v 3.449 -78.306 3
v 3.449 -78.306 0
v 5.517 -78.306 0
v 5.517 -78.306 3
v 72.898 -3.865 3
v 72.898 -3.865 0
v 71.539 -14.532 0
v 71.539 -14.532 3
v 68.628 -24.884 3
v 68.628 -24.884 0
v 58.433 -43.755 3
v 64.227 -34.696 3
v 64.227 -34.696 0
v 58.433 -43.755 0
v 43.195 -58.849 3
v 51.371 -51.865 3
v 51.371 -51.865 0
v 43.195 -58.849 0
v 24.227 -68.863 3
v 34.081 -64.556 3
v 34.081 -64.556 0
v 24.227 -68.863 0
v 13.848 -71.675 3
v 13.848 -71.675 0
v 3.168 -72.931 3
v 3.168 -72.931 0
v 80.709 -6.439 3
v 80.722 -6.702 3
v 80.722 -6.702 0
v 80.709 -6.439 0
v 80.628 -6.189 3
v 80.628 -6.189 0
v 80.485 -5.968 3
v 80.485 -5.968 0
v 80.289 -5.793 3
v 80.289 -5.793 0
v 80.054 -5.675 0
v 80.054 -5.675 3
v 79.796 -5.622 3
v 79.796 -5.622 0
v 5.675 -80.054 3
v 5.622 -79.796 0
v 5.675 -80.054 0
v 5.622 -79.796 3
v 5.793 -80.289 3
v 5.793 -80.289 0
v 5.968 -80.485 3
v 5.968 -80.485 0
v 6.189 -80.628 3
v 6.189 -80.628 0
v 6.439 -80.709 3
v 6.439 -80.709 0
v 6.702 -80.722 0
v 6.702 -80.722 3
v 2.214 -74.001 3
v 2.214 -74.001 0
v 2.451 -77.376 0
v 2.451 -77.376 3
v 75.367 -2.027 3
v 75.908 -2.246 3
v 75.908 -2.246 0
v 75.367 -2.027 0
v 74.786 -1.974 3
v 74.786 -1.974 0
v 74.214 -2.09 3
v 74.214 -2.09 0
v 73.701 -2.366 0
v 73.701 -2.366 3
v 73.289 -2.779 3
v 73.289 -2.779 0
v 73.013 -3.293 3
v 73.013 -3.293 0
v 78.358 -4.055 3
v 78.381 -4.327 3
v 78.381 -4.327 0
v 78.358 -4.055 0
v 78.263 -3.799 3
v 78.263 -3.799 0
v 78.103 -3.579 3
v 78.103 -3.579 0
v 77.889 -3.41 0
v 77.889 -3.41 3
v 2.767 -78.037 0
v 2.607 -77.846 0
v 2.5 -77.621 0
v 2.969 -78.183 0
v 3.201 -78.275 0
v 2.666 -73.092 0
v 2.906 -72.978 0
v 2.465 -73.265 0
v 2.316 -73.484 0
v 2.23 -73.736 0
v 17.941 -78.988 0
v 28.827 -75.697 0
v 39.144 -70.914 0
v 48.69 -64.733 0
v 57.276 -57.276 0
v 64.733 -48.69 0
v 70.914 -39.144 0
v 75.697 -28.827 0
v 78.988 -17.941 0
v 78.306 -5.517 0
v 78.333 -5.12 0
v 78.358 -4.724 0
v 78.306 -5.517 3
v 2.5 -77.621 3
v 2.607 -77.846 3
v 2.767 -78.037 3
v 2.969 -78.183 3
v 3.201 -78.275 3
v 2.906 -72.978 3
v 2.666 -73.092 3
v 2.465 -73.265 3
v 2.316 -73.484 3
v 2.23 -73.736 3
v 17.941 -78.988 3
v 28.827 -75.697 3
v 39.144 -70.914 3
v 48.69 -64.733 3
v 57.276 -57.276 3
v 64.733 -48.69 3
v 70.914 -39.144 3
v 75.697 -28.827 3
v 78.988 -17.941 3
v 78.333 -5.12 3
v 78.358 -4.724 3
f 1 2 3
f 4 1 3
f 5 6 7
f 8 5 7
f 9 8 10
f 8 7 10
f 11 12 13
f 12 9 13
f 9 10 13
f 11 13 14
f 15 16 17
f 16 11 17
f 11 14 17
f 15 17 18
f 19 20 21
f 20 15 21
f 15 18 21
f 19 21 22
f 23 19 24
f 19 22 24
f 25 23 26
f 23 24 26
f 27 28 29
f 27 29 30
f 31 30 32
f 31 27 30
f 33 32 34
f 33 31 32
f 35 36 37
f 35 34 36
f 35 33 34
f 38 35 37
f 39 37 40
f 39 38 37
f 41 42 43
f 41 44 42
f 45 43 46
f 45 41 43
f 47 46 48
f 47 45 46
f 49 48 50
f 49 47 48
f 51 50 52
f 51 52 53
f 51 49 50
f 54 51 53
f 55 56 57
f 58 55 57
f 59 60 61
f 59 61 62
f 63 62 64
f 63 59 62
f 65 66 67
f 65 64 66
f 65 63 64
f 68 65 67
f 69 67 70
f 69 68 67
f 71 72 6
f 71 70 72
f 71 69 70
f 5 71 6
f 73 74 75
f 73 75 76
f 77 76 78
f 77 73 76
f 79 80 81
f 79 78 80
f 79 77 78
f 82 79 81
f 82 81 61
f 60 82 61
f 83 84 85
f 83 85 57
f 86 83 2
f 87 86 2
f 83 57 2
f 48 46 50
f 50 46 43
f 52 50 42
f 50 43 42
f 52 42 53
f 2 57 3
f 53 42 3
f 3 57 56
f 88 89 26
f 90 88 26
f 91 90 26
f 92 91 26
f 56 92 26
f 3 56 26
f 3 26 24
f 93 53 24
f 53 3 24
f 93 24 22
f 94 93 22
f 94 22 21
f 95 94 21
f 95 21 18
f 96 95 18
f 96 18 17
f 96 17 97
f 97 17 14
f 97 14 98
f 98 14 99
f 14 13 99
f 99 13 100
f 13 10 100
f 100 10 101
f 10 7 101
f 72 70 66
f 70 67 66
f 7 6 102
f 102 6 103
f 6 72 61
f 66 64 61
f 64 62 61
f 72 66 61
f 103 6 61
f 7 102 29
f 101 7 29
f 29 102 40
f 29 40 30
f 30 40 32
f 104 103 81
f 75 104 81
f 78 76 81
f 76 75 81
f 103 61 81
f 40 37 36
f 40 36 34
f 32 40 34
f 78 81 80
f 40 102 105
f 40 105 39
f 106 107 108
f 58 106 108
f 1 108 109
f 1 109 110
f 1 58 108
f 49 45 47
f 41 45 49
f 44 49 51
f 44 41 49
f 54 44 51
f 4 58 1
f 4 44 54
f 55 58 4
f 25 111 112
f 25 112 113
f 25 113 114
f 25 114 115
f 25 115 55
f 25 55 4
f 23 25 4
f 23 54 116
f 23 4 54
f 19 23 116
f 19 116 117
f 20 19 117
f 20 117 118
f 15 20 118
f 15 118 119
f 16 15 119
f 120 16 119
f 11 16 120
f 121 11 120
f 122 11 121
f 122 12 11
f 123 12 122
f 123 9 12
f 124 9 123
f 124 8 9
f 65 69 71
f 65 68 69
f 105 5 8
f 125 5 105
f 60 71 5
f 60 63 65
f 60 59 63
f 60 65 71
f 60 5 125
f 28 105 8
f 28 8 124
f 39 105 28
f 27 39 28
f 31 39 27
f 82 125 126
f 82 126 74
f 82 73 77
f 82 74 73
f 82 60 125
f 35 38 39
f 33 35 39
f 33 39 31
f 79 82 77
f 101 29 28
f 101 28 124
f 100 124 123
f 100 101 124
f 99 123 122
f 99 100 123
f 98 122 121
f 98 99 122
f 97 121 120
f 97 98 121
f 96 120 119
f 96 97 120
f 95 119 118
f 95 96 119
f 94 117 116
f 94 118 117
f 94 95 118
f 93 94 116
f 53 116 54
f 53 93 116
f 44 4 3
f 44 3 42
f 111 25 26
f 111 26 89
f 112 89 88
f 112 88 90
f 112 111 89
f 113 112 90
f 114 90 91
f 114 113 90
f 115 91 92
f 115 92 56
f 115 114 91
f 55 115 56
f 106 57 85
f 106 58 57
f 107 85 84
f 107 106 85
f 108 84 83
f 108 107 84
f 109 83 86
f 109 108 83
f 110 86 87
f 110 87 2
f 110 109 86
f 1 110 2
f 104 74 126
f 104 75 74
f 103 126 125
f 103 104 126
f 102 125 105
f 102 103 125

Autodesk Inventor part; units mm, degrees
ref_plane "YZ Plane" through (0, 0, 0) normal (1, 0, 0) x (0, 1, 0)
ref_plane "XZ Plane" through (0, 0, 0) normal (0, 1, 0) x (-1, 0, 0)
ref_plane "XY Plane" through (0, 0, 0) normal (0, 0, 1) x (1, 0, 0)
sketch "Sketch1" plane through (0, 0, 0) normal (0, 0, 1) x (1, 0, 0)
  arc A0 (5.6926, -80.7997) -> (80.8293, -5.2553) centre (0, 0) ccw
  arc A1 (2.1409, -72.9686) -> (72.998, -0.5377) centre (0, 0) ccw
  line L0 (72.998, -0.5377) -> (80.8095, -0.5953) construction
  line L1 (0, 0) -> (0, 0) construction
  line L2 (2.1409, -72.9686) -> (2.5169, -78.3059)
  line L3 (2.5169, -78.3059) -> (5.5169, -78.3059)
  line L4 (5.5169, -78.3059) -> (5.6926, -80.7997)
  line L5 (78.412, -3.7169) -> (72.998, -0.5377)
  line L6 (78.3059, -5.5169) -> (80.7997, -5.6926)
  arc A2 (78.3059, -5.5169) -> (78.412, -3.7169) centre (0, 0) ccw
  line L7 (0, 0) -> (0, -120.2528) construction
  line L8 (0, 0) -> (5.9355, -84.2471) construction
  line L9 (0, 0) -> (88.2589, 0) construction
  line L10 (0, 0) -> (93.5685, -6.5922) construction
  line L11 (72.998, -0.5377) -> (0, 0) construction
  dimension "d0" = 162
  dimension "d1" = 146
  dimension "d38" = 2.5
  dimension "d39" = 3
  dimension "d40" = 30
  dimension "d52" = 78.5
  dimension "d53" = 1.8
  dimension "d55" = 4.03
  dimension "d57" = 4.03
extrude "Extrusion1" add sketch "Sketch1" along normal blind 3
fillet "Fillet6" radius 2 1 edges at (72.998, -0.5377, 1.5)
sketch "Sketch5" plane through (0, 0, 3) normal (0, 0, 1) x (1, 0, 0)
  line L0 (10.4211, -74.15) -> (12.817, -75.9554)
  line L1 (12.817, -75.9554) -> (11.0116, -78.3513)
  line L2 (11.0116, -78.3513) -> (8.6157, -76.5459)
  line L3 (8.6157, -76.5459) -> (10.4211, -74.15)
  line L4 (0, 0) -> (11.0116, -78.3513) construction
  line L5 (12.817, -75.9554) -> (8.6157, -76.5459) construction
  line L6 (0, 0) -> (0, -125.3413) construction
  line L7 (15.0785, -75.539) -> (16.6742, -72.9985)
  line L8 (16.6742, -72.9985) -> (19.2146, -74.5942)
  line L9 (19.2146, -74.5942) -> (17.619, -77.1347)
  line L10 (17.619, -77.1347) -> (15.0785, -75.539)
  line L11 (21.4327, -73.9874) -> (22.8071, -71.3208)
  line L12 (22.8071, -71.3208) -> (25.4737, -72.6952)
  line L13 (25.4737, -72.6952) -> (24.0993, -75.3618)
  line L14 (24.0993, -75.3618) -> (21.4327, -73.9874)
  line L15 (27.6323, -71.9024) -> (28.7755, -69.1288)
  line L16 (28.7755, -69.1288) -> (31.5492, -70.272)
  line L17 (31.5492, -70.272) -> (30.406, -73.0456)
  line L18 (30.406, -73.0456) -> (27.6323, -71.9024)
  line L19 (33.6327, -69.2989) -> (34.5365, -66.4383)
  line L20 (34.5365, -66.4383) -> (37.3971, -67.3421)
  line L21 (37.3971, -67.3421) -> (36.4933, -70.2027)
  line L22 (36.4933, -70.2027) -> (33.6327, -69.2989)
  line L23 (39.3906, -66.1958) -> (40.0484, -63.2688)
  line L24 (40.0484, -63.2688) -> (42.9754, -63.9266)
  line L25 (42.9754, -63.9266) -> (42.3176, -66.8536)
  line L26 (42.3176, -66.8536) -> (39.3906, -66.1958)
  line L27 (44.8644, -62.6154) -> (45.2716, -59.6431)
  line L28 (45.2716, -59.6431) -> (48.2438, -60.0503)
  line L29 (48.2438, -60.0503) -> (47.8367, -63.0225)
  line L30 (47.8367, -63.0225) -> (44.8644, -62.6154)
  line L31 (50.0148, -58.5834) -> (50.1683, -55.5874)
  line L32 (50.1683, -55.5874) -> (53.1644, -55.7409)
  line L33 (53.1644, -55.7409) -> (53.0109, -58.737)
  line L34 (53.0109, -58.737) -> (50.0148, -58.5834)
  line L35 (54.8046, -54.1291) -> (54.7033, -51.1308)
  line L36 (54.7033, -51.1308) -> (57.7016, -51.0296)
  line L37 (57.7016, -51.0296) -> (57.8028, -54.0279)
  line L38 (57.8028, -54.0279) -> (54.8046, -54.1291)
  line L39 (59.1991, -49.2845) -> (58.8439, -46.3056)
  line L40 (58.8439, -46.3056) -> (61.8228, -45.9504)
  line L41 (61.8228, -45.9504) -> (62.178, -48.9293)
  line L42 (62.178, -48.9293) -> (59.1991, -49.2845)
  line L43 (63.1669, -44.0845) -> (62.5602, -41.1465)
  line L44 (62.5602, -41.1465) -> (65.4982, -40.5399)
  line L45 (65.4982, -40.5399) -> (66.1049, -43.4779)
  line L46 (66.1049, -43.4779) -> (63.1669, -44.0845)
  line L47 (66.6792, -38.5667) -> (65.8254, -35.6907)
  line L48 (65.8254, -35.6907) -> (68.7014, -34.837)
  line L49 (68.7014, -34.837) -> (69.5551, -37.713)
  line L50 (69.5551, -37.713) -> (66.6792, -38.5667)
  line L51 (69.7107, -32.7708) -> (68.616, -29.9776)
  line L52 (68.616, -29.9776) -> (71.4092, -28.883)
  line L53 (71.4092, -28.883) -> (72.5038, -31.6761)
  line L54 (72.5038, -31.6761) -> (69.7107, -32.7708)
  line L55 (72.2395, -26.7386) -> (70.9119, -24.0483)
  line L56 (70.9119, -24.0483) -> (73.6021, -22.7207)
  line L57 (73.6021, -22.7207) -> (74.9298, -25.4109)
  line L58 (74.9298, -25.4109) -> (72.2395, -26.7386)
  line L59 (74.2475, -20.5136) -> (72.6964, -17.9457)
  line L60 (72.6964, -17.9457) -> (75.2643, -16.3946)
  line L61 (75.2643, -16.3946) -> (76.8154, -18.9625)
  line L62 (76.8154, -18.9625) -> (74.2475, -20.5136)
  line L63 (75.7202, -14.1407) -> (73.9568, -11.7136)
  line L64 (73.9568, -11.7136) -> (76.3838, -9.9503)
  line L65 (76.3838, -9.9503) -> (78.1472, -12.3773)
  line L66 (78.1472, -12.3773) -> (75.7202, -14.1407)
  line L67 (73.9568, -11.7136) -> (78.1472, -12.3773) construction
  point P0 (10.7163, -76.2506)
  dimension "d43" = 3
  dimension "d44" = 77
  dimension "d45" = 8
  dimension "d48" = 73
  dimension "d58" = 73
extrude "Extrusion5" [suppressed]
fillet "Fillet7" radius 1 5 edges at (78.412, -3.7169, 1.5) (80.7997, -5.6926, 1.5) (5.6926, -80.7997, 1.5) (2.1409, -72.9686, 1.5) (2.5169, -78.3059, 1.5)
sketch "Sketch3" plane through (0, 0, 3) normal (0, 0, 1) x (1, 0, 0)
  line L0 (10, -73.0753) -> (2.1409, -73.0753) projected
  circle A0 centre (3.5, -73.0753) radius 1.5
  line L1 (2.1409, -72.9686) -> (2.7074, -81.01) construction
  line L2 (2, -77.0253) -> (11.8753, -77.0253) construction
  ellipse E0 centre (3.5, -81.0253) end of major axis (5, -81.0253) minor radius 0.75
  point P0 (0, 0)
  point P1 (5.6926, -80.7997)
  point P2 (2, -73.0753)
  point P3 (5, -73.0753)
  dimension "d15" = 3
  dimension "d16" = 1.5
  dimension "d20" = 0.75
  dimension "d21" = 1.5
  dimension "d22" = 4
sketch "Sketch4" plane through (0, 0, 3) normal (0, 0, 1) x (1, 0, 0)
  line L0 (80.9861, -1.5) -> (70.9842, -1.5) projected
  line L1 (80.9861, -1.5) -> (78.9861, -1.5)
  line L2 (78.9861, -4) -> (80.9012, -4)
  arc A0 (4.9576, -80.8481) -> (80.9861, -1.5) centre (0, 0) ccw projected
  arc A1 (80.9012, -4) -> (80.9861, -1.5) centre (0, 0) ccw
  line L3 (78.9861, -1.5) -> (78.9861, -4)
  line L4 (74.2542, -1.5) -> (70.9842, -1.5)
  arc A2 (10.8472, -70.1665) -> (70.9842, -1.5) centre (0, 0) ccw projected
  arc A3 (70.8727, -4.25) -> (70.9842, -1.5) centre (0, 0) ccw
  line L5 (70.8727, -4.25) -> (74.2542, -4.25)
  line L6 (74.2542, -4.25) -> (74.2542, -1.5)
  point P0 (10, -70.2922)
  dimension "d25" = 2.5
  dimension "d30" = 2
  dimension "d31" = 2.75
  dimension "d32" = 3.27
equation "\"d16\" = 0.5 * d15"
properties part number "shim_cartridge_V4"
